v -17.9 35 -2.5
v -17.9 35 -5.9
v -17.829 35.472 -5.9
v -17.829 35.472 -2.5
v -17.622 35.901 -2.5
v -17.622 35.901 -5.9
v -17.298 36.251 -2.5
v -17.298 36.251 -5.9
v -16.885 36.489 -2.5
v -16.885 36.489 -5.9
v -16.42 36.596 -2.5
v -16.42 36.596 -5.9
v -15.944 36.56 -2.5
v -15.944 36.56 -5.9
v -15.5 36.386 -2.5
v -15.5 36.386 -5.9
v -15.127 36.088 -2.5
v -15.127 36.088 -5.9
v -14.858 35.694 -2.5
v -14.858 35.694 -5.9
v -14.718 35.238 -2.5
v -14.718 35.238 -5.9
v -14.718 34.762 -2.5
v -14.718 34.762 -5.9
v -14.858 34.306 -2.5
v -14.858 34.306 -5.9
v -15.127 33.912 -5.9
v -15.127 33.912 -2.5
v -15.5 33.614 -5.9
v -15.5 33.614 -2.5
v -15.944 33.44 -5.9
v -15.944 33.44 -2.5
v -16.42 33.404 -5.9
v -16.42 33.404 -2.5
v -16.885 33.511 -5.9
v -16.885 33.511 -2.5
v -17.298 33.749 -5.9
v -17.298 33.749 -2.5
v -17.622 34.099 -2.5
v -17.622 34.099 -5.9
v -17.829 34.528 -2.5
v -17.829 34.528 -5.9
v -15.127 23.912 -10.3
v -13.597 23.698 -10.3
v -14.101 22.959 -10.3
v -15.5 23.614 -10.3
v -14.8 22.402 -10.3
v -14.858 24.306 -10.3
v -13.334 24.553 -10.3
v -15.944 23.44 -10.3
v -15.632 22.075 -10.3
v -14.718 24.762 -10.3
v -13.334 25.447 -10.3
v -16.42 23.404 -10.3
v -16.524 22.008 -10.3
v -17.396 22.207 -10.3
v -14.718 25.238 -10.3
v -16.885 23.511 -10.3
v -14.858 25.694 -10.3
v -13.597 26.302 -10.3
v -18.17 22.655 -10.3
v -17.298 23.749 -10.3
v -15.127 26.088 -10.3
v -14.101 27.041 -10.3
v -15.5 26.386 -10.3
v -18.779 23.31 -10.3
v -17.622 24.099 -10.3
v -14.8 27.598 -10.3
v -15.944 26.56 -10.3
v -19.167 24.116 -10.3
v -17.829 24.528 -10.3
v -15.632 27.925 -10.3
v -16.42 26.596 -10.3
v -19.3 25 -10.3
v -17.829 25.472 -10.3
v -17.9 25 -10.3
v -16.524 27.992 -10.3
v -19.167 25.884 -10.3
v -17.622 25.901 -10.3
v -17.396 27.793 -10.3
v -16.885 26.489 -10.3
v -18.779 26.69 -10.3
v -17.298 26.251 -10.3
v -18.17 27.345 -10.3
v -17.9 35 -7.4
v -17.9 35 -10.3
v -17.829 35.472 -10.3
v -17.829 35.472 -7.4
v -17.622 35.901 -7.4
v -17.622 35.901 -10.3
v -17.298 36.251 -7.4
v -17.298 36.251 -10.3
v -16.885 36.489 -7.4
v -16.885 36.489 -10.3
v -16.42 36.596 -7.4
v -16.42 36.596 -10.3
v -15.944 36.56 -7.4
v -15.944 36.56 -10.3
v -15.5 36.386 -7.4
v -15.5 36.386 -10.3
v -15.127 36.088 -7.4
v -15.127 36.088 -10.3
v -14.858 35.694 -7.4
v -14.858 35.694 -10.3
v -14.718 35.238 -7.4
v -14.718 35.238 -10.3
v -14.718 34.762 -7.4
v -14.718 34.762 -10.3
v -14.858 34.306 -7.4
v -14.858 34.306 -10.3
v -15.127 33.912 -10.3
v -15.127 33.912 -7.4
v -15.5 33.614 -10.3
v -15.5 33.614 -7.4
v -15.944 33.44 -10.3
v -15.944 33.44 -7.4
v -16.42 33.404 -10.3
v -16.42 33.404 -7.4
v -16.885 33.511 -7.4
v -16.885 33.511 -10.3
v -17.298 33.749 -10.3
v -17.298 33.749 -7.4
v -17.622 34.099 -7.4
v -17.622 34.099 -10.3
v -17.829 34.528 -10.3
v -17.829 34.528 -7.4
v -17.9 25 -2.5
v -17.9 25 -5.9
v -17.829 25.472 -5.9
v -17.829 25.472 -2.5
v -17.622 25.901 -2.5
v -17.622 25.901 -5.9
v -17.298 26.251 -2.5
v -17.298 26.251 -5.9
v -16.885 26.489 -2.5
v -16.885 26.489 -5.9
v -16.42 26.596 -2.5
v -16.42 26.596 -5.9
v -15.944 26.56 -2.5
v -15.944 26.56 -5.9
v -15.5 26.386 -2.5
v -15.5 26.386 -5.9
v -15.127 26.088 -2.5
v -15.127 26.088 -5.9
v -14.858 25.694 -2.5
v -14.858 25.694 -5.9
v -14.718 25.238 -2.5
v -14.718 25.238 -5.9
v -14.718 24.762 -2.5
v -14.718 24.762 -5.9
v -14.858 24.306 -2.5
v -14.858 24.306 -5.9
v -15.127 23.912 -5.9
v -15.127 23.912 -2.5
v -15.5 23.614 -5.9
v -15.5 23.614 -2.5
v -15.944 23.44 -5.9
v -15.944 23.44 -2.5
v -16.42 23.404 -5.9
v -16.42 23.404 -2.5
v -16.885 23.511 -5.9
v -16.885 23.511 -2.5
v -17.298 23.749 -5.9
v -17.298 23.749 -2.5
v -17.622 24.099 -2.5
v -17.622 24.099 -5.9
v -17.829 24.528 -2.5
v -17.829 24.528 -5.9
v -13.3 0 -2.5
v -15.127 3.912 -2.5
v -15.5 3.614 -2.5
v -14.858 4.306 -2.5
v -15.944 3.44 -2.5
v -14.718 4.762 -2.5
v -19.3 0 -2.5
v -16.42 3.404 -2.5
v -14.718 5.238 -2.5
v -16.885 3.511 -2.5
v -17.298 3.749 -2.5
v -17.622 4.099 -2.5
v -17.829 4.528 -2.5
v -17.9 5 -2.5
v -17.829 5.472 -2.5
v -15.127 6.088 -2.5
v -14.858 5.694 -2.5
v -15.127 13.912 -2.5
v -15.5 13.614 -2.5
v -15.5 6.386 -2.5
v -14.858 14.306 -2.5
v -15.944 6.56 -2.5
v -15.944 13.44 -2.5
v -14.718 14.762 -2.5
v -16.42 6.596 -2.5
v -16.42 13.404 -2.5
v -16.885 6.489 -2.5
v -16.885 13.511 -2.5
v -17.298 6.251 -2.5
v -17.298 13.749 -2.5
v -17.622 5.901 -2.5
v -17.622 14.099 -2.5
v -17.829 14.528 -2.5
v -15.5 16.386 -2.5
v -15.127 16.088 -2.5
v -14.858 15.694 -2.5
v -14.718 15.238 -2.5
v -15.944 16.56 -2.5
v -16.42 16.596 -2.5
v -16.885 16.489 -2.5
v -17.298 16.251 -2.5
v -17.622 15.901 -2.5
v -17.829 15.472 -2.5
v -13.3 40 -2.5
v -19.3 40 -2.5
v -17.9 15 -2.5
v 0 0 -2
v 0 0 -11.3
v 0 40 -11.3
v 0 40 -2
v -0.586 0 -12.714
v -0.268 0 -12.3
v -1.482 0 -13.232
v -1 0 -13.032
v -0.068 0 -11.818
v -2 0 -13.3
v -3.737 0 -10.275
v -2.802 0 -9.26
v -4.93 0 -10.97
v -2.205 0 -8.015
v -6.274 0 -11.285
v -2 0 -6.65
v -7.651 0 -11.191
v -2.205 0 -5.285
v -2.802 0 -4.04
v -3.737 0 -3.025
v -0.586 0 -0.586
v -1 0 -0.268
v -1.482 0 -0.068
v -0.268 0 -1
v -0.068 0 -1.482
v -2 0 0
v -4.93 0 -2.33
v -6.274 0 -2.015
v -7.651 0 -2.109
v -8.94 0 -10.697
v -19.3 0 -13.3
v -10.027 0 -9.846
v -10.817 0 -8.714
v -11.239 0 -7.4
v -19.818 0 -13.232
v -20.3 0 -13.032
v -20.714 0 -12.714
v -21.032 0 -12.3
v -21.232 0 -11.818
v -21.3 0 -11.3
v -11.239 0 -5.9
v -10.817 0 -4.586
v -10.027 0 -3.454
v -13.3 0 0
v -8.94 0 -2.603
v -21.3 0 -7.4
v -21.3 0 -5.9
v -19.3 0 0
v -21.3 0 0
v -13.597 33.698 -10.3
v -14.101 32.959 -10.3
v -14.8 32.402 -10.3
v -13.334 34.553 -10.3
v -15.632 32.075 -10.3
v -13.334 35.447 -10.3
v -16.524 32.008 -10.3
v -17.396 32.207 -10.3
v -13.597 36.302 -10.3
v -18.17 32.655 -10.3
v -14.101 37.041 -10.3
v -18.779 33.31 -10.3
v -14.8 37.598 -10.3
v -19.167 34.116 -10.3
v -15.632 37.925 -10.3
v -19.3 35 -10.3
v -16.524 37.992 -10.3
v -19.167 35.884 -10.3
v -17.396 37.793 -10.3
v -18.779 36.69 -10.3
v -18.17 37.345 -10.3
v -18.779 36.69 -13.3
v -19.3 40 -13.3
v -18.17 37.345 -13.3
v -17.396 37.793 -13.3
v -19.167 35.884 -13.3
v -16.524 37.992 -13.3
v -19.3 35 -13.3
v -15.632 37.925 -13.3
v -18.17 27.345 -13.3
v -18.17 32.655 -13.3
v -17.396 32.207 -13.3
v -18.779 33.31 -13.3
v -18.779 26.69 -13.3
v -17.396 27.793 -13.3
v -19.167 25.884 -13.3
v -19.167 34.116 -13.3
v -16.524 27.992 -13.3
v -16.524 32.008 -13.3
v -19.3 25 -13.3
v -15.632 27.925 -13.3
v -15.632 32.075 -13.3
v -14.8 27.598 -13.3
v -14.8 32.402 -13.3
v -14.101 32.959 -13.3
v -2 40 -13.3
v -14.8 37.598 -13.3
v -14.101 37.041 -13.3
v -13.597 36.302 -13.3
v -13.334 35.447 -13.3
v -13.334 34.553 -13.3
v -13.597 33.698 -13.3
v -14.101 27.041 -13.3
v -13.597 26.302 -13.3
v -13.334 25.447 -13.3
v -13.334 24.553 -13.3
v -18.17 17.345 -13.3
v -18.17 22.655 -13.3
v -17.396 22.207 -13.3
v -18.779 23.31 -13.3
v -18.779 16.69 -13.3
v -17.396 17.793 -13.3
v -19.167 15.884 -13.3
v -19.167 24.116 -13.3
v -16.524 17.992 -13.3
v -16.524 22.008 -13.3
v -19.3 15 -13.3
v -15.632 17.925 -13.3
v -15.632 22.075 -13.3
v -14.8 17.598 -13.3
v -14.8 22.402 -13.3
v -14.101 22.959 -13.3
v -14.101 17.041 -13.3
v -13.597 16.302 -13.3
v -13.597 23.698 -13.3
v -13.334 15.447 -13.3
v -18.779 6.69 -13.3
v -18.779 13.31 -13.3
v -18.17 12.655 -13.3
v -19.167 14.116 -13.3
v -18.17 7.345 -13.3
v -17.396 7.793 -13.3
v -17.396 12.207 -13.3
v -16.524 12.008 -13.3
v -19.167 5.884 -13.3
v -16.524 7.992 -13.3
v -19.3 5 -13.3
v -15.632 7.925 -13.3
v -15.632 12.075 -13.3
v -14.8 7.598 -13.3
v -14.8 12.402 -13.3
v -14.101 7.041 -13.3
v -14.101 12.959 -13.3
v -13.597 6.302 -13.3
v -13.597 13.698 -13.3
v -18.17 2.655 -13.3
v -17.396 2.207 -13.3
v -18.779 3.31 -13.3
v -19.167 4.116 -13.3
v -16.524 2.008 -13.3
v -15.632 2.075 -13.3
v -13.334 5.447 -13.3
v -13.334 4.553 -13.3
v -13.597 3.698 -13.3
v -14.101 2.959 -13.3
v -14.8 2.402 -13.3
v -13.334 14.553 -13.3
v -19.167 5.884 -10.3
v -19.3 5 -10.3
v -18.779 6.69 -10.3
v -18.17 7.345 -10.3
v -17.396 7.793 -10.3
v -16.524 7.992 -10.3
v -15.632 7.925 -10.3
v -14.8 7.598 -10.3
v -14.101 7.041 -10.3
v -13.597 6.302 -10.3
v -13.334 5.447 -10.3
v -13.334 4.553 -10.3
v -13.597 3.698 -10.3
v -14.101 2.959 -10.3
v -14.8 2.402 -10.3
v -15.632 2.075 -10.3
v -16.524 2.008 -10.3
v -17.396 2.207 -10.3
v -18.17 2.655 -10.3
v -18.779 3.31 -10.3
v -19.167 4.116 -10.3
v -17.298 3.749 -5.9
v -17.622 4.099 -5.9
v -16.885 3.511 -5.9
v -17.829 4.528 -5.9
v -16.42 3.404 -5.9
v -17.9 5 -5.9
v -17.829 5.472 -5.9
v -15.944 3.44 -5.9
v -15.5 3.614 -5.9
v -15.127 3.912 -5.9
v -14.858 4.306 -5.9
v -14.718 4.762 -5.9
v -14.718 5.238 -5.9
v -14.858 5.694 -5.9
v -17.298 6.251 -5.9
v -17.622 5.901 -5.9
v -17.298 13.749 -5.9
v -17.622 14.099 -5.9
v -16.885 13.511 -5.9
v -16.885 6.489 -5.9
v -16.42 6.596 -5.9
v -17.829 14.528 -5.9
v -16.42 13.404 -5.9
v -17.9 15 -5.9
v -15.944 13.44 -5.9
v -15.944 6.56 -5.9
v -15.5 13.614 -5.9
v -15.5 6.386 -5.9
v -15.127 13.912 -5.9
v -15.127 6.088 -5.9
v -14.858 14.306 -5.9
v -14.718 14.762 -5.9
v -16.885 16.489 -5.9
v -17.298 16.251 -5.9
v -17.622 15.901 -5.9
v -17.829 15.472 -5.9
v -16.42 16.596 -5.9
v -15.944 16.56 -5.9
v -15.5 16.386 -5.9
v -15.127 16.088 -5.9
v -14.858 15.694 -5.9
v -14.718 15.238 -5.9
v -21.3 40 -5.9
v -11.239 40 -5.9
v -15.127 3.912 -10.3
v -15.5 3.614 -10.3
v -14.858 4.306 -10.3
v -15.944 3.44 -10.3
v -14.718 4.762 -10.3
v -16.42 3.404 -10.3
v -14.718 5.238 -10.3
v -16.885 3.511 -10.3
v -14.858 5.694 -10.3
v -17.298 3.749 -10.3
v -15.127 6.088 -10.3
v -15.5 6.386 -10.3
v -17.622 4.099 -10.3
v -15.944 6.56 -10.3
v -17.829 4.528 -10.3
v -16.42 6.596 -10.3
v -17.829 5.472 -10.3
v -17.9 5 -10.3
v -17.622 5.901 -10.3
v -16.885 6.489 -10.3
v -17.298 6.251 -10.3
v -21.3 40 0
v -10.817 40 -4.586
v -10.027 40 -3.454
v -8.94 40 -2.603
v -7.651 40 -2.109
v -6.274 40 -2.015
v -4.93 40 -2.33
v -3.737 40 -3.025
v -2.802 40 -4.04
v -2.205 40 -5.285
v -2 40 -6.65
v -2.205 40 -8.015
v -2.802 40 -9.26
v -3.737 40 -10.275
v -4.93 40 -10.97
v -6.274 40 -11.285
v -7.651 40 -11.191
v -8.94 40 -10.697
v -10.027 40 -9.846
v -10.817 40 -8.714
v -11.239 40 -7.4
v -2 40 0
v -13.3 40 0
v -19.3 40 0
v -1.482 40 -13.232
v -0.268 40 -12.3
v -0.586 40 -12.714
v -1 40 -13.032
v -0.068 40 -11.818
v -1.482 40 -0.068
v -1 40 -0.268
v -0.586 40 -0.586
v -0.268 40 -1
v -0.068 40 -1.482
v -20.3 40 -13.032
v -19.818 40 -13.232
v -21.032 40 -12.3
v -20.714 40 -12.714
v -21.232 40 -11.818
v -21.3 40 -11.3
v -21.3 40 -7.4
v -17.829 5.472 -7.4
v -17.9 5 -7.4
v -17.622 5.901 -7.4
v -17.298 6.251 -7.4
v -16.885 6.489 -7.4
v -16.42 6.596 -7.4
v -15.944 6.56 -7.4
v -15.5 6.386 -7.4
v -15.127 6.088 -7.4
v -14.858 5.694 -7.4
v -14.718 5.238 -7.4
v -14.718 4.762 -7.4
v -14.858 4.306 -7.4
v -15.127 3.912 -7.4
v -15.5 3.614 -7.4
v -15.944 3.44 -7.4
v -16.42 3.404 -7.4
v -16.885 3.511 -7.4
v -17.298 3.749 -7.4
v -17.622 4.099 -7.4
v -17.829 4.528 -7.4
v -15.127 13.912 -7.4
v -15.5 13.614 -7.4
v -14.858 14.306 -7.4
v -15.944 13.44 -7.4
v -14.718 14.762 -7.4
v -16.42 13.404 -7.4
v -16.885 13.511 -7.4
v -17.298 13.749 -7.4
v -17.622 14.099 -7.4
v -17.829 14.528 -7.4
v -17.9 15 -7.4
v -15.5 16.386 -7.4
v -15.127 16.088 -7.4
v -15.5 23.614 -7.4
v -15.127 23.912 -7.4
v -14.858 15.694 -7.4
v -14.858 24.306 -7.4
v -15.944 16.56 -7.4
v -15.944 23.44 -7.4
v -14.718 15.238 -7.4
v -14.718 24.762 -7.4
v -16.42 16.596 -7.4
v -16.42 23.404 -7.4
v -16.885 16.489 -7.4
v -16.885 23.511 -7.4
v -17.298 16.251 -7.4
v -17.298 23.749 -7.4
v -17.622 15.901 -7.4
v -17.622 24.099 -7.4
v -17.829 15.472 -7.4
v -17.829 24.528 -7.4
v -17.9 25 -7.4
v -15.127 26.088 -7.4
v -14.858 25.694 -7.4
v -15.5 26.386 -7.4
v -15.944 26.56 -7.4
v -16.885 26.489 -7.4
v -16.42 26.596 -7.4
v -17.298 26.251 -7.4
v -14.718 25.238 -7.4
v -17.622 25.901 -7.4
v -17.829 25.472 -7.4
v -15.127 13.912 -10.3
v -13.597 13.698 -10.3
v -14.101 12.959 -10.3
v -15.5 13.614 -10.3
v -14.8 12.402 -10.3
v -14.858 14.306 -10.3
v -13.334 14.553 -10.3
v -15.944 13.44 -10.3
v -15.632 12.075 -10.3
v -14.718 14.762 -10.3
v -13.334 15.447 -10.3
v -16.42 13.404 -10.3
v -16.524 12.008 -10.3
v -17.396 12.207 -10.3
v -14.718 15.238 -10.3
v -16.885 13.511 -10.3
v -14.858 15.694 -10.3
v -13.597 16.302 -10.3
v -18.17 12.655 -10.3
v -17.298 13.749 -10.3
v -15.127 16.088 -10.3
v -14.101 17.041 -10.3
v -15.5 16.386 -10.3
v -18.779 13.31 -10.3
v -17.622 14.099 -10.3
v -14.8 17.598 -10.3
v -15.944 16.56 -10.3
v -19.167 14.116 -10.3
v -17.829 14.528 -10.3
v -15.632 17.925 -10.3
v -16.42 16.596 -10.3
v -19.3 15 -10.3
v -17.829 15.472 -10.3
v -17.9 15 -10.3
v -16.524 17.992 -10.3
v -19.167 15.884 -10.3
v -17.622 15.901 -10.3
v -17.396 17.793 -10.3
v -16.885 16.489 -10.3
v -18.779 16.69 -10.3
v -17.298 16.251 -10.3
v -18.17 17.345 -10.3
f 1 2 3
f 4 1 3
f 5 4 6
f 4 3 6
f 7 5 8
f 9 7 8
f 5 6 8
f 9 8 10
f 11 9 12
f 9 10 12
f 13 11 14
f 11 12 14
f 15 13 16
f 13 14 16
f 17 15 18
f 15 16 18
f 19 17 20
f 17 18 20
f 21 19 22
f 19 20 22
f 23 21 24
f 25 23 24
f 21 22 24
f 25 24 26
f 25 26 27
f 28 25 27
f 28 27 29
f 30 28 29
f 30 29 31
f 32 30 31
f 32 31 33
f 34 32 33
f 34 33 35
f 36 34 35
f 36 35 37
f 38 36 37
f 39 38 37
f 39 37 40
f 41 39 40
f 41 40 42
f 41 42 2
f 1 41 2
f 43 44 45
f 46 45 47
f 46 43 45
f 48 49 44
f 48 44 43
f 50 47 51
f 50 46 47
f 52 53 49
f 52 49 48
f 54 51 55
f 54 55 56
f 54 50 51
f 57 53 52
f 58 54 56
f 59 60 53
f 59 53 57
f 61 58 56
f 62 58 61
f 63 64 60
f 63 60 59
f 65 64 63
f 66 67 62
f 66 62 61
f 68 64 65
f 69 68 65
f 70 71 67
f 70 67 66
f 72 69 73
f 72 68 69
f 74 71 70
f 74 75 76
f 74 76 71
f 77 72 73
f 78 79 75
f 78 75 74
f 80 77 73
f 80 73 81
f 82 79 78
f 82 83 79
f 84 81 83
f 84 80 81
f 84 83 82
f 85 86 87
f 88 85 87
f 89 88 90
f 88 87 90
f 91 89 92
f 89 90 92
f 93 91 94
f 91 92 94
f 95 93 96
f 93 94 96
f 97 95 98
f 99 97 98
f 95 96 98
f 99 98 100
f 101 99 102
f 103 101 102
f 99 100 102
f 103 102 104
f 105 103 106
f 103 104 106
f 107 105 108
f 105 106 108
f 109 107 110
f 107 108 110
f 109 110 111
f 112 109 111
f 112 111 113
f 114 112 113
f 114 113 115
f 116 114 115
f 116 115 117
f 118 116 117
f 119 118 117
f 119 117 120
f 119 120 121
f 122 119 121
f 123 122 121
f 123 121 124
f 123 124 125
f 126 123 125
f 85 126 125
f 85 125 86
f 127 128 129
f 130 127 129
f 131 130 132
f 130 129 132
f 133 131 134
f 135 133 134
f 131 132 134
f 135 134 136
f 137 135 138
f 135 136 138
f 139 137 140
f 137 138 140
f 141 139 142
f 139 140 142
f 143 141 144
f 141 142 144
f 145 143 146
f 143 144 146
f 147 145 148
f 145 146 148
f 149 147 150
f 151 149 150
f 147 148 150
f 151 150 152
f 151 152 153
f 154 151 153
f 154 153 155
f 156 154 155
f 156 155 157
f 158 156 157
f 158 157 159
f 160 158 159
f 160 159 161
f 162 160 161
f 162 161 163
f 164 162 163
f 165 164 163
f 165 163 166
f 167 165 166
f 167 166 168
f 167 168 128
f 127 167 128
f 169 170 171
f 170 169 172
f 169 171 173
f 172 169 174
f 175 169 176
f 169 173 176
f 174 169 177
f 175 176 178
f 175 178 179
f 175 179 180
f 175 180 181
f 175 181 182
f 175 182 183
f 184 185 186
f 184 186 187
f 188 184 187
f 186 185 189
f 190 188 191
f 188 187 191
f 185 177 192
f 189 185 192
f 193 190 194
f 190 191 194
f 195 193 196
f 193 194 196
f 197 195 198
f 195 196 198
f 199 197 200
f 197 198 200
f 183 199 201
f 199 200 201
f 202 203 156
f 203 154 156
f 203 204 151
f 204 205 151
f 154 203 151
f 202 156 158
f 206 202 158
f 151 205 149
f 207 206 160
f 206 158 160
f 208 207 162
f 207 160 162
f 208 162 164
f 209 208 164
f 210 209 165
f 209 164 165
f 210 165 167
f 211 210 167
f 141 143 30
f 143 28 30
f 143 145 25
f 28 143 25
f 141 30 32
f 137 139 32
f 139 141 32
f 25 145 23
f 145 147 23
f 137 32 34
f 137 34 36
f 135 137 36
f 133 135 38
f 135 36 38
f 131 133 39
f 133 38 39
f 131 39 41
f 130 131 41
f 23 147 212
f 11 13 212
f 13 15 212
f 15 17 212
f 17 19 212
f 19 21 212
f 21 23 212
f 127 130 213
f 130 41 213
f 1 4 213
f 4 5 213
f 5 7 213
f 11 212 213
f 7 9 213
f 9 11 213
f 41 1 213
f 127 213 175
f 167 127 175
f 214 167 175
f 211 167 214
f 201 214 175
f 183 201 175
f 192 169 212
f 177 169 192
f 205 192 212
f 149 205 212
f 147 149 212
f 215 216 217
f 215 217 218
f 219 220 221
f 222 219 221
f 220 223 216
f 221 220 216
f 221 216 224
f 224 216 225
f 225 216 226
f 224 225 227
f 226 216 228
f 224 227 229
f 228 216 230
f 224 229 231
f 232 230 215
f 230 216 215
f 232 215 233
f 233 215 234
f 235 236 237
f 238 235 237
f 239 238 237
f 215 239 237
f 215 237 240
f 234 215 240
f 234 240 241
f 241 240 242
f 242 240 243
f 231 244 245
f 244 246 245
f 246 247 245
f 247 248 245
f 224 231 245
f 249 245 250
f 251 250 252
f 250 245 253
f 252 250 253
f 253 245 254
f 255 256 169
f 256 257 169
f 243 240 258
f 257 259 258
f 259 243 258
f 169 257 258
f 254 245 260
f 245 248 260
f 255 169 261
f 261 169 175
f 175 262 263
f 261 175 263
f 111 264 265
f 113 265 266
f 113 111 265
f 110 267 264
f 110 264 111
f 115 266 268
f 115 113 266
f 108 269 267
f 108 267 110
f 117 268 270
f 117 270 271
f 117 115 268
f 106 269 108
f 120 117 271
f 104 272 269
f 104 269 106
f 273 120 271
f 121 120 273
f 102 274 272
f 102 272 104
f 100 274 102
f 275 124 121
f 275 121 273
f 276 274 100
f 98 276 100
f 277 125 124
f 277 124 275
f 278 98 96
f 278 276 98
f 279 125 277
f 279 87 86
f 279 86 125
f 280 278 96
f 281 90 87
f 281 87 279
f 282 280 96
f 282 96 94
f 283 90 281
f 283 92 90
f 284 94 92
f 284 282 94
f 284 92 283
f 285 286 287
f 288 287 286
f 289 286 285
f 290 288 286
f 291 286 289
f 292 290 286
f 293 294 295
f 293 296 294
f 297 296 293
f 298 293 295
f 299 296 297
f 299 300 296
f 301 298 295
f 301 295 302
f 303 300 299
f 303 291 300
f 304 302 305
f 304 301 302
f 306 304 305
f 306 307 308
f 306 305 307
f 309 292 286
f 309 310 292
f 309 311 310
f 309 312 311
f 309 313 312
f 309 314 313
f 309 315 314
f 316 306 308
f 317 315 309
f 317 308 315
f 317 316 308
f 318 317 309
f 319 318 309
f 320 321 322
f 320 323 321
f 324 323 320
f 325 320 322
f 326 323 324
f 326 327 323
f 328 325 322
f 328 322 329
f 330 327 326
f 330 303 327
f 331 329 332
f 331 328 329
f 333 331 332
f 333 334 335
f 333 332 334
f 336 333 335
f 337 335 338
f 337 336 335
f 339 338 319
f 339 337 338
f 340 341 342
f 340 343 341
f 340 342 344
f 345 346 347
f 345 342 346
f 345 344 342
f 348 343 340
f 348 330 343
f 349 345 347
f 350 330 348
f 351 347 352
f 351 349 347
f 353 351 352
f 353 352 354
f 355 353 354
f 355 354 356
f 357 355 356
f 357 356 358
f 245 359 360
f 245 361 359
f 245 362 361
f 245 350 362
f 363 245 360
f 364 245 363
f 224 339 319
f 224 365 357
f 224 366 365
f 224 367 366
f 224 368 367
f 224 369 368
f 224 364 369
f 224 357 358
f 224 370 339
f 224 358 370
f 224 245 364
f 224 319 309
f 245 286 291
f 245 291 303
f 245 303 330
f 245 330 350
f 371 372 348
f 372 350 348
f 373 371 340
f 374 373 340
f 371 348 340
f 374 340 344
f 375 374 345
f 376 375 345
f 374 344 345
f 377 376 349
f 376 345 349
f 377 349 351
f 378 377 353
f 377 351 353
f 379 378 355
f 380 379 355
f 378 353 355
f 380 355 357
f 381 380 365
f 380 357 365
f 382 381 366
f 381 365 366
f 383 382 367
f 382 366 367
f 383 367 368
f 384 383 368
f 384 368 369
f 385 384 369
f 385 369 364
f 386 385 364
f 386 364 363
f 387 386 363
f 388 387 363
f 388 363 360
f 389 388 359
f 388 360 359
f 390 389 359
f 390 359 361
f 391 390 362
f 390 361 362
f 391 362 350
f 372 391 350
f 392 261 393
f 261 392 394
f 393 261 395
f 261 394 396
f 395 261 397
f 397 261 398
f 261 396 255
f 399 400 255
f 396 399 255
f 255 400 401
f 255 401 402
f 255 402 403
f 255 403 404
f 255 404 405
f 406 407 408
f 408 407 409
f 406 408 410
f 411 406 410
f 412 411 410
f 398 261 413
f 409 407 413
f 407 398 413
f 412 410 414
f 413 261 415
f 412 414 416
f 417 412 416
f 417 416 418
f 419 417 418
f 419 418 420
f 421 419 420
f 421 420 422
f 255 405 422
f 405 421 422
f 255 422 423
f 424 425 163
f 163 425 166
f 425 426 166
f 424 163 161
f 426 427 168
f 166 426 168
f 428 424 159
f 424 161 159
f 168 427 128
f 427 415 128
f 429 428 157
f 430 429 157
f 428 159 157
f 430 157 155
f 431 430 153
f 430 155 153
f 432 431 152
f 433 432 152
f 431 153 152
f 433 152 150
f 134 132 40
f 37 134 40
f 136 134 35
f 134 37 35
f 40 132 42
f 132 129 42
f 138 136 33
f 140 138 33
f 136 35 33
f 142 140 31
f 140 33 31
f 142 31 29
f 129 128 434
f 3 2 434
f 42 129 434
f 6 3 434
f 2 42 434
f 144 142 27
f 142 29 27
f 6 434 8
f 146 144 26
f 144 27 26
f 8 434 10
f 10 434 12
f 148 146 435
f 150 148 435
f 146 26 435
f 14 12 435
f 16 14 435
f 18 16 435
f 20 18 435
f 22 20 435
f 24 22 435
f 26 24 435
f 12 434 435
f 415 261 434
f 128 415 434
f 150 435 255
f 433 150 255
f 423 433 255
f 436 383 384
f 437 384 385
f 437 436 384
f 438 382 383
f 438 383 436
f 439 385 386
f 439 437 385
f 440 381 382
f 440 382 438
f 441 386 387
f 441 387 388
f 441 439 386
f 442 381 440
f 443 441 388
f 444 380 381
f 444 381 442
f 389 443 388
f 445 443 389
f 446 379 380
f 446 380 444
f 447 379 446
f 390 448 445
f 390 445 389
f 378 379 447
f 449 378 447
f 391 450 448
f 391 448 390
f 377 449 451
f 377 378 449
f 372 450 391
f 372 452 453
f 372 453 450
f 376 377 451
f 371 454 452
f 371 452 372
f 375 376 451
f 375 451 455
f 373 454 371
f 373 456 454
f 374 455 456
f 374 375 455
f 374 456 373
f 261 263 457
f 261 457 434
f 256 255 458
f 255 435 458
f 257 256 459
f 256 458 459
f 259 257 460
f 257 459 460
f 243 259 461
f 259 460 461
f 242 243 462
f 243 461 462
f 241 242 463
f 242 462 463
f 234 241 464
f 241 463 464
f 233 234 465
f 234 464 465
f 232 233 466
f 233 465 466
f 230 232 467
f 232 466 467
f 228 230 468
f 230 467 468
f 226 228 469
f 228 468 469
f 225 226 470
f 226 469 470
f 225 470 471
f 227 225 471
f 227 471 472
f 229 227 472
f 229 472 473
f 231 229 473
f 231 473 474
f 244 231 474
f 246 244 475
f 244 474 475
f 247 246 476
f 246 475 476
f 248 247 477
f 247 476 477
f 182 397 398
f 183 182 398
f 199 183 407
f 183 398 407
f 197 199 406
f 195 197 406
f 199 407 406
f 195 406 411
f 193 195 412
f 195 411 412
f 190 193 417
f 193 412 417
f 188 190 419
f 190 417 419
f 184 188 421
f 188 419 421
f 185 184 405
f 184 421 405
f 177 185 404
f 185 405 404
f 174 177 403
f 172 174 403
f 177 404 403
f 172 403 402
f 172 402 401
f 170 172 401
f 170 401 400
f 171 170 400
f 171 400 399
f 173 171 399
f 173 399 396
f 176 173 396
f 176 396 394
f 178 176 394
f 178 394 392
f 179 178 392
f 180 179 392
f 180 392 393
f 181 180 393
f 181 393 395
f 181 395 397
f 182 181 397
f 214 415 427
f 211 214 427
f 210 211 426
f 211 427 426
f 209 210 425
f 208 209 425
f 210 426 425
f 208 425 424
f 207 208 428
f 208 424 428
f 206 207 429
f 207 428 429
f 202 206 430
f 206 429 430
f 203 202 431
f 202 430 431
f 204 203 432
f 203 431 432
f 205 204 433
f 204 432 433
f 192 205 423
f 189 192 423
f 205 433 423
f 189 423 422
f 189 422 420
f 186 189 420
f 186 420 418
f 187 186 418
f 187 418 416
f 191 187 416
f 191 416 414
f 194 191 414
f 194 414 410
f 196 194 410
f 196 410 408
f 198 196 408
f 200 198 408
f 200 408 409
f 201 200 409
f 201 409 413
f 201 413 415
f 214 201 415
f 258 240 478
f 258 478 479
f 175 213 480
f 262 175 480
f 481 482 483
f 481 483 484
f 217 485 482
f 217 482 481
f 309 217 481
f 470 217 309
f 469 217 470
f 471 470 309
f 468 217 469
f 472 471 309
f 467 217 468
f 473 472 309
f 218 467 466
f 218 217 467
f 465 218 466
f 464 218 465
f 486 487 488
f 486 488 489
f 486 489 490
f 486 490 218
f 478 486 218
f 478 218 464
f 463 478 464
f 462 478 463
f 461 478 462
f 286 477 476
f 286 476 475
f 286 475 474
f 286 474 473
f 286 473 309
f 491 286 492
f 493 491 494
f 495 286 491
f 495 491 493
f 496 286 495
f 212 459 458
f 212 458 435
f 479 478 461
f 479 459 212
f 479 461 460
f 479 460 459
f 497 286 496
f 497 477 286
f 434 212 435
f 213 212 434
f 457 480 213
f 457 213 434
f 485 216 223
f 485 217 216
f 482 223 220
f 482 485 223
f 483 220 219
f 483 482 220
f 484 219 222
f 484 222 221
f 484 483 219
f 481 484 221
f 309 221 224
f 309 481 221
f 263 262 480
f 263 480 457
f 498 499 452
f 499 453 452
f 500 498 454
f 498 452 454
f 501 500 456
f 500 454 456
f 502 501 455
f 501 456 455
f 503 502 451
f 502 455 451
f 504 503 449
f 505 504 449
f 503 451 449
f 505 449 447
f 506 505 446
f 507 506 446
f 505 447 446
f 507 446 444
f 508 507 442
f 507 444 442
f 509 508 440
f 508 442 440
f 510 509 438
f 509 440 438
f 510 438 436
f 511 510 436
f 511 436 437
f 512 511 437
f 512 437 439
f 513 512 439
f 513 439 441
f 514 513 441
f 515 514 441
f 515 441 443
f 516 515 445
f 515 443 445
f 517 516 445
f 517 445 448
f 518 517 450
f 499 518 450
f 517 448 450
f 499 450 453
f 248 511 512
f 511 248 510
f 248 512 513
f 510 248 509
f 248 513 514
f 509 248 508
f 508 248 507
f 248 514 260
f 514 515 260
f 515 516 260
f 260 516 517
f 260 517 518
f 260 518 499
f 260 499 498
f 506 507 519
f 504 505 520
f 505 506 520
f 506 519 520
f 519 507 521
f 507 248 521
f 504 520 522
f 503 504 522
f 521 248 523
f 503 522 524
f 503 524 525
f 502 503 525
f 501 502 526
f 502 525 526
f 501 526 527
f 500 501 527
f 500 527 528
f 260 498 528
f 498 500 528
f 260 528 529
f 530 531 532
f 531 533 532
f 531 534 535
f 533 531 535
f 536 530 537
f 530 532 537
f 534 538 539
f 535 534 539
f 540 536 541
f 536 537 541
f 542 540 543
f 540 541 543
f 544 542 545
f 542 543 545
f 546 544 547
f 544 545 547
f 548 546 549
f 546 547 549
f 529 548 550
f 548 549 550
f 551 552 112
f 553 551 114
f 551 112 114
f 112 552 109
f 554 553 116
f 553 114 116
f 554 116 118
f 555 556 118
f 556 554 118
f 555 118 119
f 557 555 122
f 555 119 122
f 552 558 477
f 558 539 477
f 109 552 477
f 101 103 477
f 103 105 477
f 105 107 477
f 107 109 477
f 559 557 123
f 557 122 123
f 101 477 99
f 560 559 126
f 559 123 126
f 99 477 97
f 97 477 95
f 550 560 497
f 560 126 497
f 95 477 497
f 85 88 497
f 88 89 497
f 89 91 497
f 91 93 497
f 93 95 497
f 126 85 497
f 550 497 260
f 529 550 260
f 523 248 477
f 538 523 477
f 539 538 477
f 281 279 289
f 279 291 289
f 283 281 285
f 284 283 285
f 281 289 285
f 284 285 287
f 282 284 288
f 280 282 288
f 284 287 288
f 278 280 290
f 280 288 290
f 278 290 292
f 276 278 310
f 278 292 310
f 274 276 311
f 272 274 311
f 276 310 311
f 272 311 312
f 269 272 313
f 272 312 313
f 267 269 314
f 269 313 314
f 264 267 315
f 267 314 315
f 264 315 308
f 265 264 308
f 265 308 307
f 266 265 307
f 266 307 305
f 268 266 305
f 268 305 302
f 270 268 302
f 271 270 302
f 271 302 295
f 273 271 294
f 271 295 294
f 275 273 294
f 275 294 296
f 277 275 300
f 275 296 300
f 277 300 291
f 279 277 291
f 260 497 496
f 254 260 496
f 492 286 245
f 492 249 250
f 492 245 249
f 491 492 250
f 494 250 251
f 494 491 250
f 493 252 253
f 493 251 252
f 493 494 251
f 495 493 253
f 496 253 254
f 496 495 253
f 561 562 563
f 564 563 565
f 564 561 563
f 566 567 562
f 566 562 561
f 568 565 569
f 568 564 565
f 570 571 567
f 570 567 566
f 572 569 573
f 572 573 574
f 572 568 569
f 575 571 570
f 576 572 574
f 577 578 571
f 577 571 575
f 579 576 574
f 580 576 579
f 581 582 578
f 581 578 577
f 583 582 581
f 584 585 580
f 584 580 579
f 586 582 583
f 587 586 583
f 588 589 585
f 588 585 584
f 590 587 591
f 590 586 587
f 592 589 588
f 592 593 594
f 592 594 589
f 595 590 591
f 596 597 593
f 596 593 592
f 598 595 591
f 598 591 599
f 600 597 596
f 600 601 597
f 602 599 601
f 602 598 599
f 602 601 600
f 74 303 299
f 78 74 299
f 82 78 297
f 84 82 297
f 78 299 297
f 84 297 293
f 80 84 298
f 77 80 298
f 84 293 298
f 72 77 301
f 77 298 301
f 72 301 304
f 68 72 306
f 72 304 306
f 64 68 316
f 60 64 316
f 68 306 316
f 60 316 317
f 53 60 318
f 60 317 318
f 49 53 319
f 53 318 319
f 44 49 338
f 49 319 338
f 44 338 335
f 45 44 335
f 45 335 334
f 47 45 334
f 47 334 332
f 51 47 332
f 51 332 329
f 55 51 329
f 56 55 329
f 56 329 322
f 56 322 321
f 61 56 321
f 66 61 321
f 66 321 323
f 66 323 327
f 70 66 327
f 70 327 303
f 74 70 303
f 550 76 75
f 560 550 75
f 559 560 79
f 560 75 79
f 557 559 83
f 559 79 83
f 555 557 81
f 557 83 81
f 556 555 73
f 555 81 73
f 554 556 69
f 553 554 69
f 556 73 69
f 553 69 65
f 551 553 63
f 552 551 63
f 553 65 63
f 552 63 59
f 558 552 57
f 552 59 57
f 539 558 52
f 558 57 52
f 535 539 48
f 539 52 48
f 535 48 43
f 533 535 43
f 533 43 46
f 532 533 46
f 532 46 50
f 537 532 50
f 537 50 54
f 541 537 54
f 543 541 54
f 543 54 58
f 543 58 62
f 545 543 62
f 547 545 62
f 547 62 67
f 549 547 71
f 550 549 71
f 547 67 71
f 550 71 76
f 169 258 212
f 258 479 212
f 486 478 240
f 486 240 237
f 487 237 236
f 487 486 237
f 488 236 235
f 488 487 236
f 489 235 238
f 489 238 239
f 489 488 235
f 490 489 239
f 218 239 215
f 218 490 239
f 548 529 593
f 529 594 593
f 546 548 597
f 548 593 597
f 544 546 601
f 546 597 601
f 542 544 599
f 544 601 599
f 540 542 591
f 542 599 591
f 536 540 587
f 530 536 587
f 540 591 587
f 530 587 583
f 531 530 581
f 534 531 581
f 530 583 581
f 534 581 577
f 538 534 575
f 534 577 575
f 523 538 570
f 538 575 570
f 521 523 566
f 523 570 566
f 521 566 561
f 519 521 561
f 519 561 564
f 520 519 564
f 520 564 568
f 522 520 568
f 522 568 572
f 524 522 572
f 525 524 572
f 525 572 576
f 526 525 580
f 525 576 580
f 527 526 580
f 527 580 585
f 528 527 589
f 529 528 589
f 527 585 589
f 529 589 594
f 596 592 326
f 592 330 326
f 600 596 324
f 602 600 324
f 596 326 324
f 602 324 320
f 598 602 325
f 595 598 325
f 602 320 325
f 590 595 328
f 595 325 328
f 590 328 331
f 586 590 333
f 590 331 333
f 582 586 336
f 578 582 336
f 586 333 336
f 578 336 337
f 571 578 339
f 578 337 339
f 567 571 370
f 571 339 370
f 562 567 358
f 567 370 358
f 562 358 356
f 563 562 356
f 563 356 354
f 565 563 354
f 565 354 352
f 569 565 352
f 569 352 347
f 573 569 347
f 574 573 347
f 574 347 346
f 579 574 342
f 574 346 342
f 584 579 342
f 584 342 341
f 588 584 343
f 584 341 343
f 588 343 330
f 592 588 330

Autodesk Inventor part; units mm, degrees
ref_plane "YZ Plane" through (0, 0, 0) normal (1, 0, 0) x (0, 1, 0)
ref_plane "XZ Plane" through (0, 0, 0) normal (0, 1, 0) x (-1, 0, 0)
ref_plane "XY Plane" through (0, 0, 0) normal (0, 0, 1) x (1, 0, 0)
sketch "Sketch1" plane through (0, 0, 0) normal (0, 1, 0) x (-1, 0, 0)
  line L0 (0, 0) -> (21.3, 0)
  line L1 (21.3, 0) -> (21.3, -13.3)
  line L2 (21.3, -13.3) -> (0, -13.3)
  line L3 (0, -13.3) -> (0, 0)
  dimension "d0" = 21.3
  dimension "d1" = 13.3
extrude "Extrusion1" add sketch "Sketch1" along normal blind 40
sketch "Sketch2" plane through (0, 40, 0) normal (0, 1, 0) x (1, 0, 0)
  circle A0 centre (-6.65, 6.65) radius 4.65
  line L0 (0, 0) -> (0, 13.3) projected
  line L1 (-21.3, 0) -> (0, 0) projected
  dimension "d4" = 9.3
  dimension "d5" = 6.65
  dimension "d6" = 6.65
extrude "Extrusion2" cut sketch "Sketch2" against normal through all
sketch "Sketch3" plane through (0, 40, 0) normal (0, 1, 0) x (1, 0, 0)
  line L0 (-21.3, 5.9) -> (-9.3, 5.9)
  line L1 (-9.3, 5.9) -> (-9.3, 7.4)
  line L2 (-9.3, 7.4) -> (-21.3, 7.4)
  line L3 (-21.3, 7.4) -> (-21.3, 5.9)
  line L4 (0, 13.3) -> (-21.3, 13.3) projected
  line L5 (-21.3, 13.3) -> (-21.3, 0) projected
  point P0 (0, 0)
  dimension "d9" = 1.5
  dimension "d10" = 5.9
  dimension "d11" = 12
extrude "Extrusion3" cut sketch "Sketch3" against normal through all
sketch "Sketch4" plane through (0, 40, 0) normal (0, 1, 0) x (1, 0, 0)
  line L0 (-19.3, 0) -> (-13.3, 0)
  line L1 (-13.3, 0) -> (-13.3, 2.5)
  line L2 (-13.3, 2.5) -> (-19.3, 2.5)
  line L3 (-19.3, 2.5) -> (-19.3, 0)
  line L4 (-21.3, 5.9) -> (-21.3, 0) projected
  line L5 (-21.3, 0) -> (0, 0) projected
  dimension "d14" = 2.5
  dimension "d15" = 6
  dimension "d16" = 2
extrude "Extrusion4" cut sketch "Sketch4" against normal through all
sketch "Sketch5" plane through (0, 0, -13.3) normal (0, 0, -1) x (-1, 0, 0)
  circle A0 centre (16.3, 35) radius 1.6
  line L0 (21.3, 0) -> (21.3, 40) projected
  line L1 (0, 40) -> (21.3, 40) projected
  point P0 (0, 0)
  dimension "d19" = 3.2
  dimension "d20" = 5
  dimension "d21" = 5
extrude "Extrusion5" cut sketch "Sketch5" against normal through all
pattern_linear "Rectangular Pattern1" count 4 spacing 10 along (0, -1, 0) of "Extrusion5"
sketch "Sketch6" plane through (0, 0, -13.3) normal (0, 0, -1) x (-1, 0, 0)
  line L0 (11.2391, 0) -> (11.2391, 40) projected
  circle A0 centre (16.3, 35) radius 3
  line L1 (21.3, 0) -> (21.3, 40) projected
  line L2 (0, 40) -> (21.3, 40) projected
  point P0 (0, 0)
  dimension "d27" = 6
  dimension "d28" = 5
  dimension "d29" = 5
extrude "Extrusion6" cut sketch "Sketch6" against normal blind 3
pattern_linear "Rectangular Pattern2" count 4 spacing 10 along (0, -1, 0) of "Extrusion6"
fillet "Fillet1" radius 2 3 edges at (0, 20, -13.3) (-21.3, 20, -13.3) (0, 20, 0)
equation "\"d6\" = d5"
properties part number "ADAPTATEUR"
